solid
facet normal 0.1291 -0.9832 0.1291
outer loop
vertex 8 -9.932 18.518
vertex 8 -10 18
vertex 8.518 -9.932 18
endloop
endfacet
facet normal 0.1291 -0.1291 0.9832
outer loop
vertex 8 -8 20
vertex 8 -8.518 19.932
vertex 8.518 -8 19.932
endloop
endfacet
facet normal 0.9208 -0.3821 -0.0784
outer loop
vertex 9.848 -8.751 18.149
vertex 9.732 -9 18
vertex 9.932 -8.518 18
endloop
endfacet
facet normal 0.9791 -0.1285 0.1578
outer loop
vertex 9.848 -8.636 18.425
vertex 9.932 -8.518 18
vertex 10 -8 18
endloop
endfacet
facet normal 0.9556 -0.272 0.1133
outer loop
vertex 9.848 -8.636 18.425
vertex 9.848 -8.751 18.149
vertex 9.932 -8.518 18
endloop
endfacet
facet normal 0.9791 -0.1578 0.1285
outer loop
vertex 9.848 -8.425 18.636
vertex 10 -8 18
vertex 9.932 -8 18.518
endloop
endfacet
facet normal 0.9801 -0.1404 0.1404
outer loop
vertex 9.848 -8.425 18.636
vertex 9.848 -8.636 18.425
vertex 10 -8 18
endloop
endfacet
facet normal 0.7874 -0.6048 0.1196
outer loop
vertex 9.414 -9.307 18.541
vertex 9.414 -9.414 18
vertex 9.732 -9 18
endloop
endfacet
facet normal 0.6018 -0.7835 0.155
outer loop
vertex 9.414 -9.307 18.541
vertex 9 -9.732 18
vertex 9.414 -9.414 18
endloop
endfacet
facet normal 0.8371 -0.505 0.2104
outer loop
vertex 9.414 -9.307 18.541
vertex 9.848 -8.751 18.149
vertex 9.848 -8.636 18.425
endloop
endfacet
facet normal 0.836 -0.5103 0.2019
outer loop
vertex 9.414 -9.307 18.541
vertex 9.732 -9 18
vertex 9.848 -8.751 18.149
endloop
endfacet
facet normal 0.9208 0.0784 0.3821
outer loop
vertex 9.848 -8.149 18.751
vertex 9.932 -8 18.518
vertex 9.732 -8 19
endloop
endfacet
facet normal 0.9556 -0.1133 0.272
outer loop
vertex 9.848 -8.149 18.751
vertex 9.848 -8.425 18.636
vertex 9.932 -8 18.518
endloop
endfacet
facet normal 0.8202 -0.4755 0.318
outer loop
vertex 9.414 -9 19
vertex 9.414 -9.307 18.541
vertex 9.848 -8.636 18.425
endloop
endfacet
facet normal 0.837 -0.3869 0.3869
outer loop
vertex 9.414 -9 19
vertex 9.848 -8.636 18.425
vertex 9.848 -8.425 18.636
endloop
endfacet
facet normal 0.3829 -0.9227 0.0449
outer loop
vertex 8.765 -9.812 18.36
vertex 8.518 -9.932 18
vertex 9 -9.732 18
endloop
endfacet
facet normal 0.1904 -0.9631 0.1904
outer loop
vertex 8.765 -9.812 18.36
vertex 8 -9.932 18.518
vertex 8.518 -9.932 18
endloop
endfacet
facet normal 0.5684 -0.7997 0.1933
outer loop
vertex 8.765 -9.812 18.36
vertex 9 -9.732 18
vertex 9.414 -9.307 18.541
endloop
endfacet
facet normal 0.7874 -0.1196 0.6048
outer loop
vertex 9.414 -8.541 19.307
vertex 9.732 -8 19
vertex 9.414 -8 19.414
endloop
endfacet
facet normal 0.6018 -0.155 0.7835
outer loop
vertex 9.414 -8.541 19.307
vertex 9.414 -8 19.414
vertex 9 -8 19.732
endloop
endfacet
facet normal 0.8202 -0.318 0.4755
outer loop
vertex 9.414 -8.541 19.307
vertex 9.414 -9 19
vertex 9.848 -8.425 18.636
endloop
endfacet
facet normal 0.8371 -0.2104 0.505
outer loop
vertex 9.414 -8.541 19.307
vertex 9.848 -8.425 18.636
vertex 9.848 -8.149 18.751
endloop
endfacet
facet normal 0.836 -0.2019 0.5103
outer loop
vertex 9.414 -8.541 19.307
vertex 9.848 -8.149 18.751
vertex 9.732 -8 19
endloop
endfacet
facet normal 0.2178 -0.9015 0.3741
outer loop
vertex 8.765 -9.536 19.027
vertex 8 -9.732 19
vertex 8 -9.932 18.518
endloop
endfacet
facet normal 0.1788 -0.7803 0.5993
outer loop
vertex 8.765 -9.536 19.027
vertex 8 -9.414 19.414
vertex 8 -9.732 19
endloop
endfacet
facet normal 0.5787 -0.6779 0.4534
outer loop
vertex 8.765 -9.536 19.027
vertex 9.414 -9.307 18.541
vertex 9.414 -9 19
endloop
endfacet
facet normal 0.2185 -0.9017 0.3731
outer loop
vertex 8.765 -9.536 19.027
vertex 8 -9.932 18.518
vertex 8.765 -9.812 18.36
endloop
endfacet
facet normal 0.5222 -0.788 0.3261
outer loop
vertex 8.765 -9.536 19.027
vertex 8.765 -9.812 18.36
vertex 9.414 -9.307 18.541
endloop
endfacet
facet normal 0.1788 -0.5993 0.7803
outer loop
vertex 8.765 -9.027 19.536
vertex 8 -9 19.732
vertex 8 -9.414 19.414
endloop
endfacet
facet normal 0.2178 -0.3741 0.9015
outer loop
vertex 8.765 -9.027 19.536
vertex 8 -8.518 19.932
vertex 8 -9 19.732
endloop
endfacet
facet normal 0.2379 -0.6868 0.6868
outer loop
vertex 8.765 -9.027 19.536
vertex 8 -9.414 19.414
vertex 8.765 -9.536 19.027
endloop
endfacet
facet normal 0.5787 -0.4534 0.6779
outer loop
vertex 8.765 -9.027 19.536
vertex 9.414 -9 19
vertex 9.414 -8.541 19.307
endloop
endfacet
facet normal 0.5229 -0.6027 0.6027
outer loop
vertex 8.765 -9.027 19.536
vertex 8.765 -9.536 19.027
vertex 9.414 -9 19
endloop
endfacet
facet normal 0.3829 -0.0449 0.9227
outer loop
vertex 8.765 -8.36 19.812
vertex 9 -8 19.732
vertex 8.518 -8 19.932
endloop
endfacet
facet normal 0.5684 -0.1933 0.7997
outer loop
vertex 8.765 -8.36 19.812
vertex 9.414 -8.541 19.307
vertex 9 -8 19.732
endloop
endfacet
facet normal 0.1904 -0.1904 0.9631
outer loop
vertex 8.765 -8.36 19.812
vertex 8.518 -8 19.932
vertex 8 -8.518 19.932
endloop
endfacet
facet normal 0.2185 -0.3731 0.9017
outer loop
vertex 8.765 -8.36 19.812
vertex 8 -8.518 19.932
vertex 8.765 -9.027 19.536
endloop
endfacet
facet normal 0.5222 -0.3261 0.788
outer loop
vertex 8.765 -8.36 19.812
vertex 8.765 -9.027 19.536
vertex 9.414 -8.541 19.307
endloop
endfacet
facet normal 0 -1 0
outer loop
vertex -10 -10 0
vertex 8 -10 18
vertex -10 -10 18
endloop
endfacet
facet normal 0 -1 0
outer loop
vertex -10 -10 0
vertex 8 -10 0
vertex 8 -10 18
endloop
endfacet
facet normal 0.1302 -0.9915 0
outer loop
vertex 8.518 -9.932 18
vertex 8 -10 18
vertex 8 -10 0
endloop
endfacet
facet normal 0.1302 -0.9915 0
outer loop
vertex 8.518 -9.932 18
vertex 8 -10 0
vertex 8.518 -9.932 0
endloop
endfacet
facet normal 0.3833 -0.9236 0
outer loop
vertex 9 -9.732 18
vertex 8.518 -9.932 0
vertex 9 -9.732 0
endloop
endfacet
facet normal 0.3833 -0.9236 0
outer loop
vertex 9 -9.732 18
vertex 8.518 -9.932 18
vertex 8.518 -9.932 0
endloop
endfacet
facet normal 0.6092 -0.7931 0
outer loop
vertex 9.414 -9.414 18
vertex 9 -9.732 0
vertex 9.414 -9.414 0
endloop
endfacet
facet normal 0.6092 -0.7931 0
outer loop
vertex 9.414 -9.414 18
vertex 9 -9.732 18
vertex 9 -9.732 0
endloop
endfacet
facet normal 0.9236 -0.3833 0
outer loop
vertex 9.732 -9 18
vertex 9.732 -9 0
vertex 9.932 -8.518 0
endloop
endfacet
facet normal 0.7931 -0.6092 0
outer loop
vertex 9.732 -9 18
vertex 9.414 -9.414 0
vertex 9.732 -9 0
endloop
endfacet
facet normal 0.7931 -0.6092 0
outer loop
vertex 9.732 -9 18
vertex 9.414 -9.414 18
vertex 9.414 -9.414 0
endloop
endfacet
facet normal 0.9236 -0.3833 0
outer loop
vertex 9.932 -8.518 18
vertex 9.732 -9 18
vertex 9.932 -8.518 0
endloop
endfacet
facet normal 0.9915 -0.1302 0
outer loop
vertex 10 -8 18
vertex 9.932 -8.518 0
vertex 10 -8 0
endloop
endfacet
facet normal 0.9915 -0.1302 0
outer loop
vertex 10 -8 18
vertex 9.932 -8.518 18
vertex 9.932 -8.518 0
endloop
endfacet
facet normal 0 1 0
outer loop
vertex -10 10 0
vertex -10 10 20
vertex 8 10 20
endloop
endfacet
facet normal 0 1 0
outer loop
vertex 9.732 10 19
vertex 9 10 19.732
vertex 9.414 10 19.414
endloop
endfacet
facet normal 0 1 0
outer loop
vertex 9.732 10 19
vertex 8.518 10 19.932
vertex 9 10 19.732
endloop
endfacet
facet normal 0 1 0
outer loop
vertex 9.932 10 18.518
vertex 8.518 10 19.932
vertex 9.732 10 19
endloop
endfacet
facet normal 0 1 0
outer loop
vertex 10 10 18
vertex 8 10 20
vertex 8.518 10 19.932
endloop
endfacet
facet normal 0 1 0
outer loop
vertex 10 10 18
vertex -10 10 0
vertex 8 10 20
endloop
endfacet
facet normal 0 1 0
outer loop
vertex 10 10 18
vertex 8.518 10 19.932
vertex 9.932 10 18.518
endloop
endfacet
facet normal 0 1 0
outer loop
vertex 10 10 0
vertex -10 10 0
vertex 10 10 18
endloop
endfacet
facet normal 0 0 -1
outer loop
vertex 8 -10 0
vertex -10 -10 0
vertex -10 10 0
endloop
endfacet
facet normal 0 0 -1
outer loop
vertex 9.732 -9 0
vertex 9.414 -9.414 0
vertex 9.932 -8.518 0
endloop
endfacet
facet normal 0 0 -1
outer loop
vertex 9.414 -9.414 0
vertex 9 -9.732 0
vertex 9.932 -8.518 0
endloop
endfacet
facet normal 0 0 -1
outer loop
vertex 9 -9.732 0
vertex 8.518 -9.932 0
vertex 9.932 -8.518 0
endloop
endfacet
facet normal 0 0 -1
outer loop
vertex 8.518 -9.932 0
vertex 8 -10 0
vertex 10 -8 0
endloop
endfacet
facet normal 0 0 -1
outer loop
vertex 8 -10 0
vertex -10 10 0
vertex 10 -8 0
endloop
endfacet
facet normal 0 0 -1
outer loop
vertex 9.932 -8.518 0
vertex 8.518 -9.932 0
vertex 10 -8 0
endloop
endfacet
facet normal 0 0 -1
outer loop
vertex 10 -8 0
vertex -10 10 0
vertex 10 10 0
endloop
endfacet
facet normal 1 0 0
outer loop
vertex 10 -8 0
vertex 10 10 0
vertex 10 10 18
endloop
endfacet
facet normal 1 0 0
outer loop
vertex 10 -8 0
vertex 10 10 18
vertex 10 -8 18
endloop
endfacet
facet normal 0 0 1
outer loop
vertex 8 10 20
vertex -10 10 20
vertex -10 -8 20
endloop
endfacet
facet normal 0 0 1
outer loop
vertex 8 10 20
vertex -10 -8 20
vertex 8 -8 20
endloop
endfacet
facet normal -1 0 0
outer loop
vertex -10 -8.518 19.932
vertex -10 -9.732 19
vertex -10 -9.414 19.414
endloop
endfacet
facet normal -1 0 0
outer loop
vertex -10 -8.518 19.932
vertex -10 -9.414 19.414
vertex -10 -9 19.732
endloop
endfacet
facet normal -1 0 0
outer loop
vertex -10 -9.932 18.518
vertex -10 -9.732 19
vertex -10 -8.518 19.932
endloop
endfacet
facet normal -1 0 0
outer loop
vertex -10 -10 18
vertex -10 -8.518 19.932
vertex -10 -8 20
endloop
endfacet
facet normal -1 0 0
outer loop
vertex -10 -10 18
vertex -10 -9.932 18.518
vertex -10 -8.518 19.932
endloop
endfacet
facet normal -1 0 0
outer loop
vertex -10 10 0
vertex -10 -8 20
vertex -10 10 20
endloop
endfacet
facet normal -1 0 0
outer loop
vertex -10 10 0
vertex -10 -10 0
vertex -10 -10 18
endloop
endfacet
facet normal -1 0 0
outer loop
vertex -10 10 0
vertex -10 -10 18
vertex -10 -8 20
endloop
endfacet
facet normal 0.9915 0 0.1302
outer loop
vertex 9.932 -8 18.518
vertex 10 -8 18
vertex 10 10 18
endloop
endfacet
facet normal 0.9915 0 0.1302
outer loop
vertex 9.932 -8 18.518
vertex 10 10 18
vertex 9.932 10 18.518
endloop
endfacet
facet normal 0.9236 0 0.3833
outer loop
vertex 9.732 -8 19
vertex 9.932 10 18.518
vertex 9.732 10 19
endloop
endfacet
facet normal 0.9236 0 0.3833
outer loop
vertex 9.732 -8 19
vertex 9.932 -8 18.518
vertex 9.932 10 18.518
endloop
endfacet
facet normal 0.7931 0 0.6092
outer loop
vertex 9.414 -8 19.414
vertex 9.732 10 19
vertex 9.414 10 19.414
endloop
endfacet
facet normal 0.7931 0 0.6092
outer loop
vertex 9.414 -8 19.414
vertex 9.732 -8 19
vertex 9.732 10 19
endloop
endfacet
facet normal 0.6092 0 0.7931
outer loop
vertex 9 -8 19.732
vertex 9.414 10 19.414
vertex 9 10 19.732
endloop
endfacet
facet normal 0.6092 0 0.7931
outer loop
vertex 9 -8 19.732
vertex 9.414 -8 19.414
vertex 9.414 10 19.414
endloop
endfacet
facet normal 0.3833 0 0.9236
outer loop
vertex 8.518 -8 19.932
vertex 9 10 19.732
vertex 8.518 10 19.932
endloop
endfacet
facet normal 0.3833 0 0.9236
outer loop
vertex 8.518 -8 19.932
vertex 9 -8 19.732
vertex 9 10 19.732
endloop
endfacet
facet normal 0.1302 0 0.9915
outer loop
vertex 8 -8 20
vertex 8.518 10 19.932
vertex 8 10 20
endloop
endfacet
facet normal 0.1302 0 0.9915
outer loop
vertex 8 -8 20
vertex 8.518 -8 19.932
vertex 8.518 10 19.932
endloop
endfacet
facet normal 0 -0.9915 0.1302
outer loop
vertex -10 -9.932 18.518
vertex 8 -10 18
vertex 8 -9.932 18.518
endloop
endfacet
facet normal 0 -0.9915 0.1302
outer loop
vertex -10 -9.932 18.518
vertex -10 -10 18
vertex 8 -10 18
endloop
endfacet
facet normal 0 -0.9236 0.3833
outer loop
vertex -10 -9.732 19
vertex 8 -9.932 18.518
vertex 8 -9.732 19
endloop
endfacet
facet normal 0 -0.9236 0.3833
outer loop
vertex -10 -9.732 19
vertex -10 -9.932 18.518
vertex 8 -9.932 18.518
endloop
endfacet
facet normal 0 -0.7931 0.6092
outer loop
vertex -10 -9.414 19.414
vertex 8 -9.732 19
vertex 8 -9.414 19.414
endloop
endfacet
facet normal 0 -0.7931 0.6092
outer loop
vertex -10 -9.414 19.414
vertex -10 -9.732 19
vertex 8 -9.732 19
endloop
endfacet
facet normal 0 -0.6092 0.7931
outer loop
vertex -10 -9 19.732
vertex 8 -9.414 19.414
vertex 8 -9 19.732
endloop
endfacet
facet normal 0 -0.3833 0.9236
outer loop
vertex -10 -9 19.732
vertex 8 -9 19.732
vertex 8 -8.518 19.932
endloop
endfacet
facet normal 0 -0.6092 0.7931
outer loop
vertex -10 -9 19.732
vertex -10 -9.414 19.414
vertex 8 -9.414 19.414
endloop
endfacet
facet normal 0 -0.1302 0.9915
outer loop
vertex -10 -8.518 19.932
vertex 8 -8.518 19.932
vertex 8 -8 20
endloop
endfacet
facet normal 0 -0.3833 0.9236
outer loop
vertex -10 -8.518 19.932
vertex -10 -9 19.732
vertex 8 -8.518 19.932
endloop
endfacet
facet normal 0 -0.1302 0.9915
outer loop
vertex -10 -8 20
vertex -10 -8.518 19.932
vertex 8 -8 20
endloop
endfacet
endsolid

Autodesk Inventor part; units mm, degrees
ref_plane "YZ Plane" through (0, 0, 0) normal (1, 0, 0) x (0, 1, 0)
ref_plane "XZ Plane" through (0, 0, 0) normal (0, 1, 0) x (-1, 0, 0)
ref_plane "XY Plane" through (0, 0, 0) normal (0, 0, 1) x (1, 0, 0)
sketch "Sketch1" plane through (0, 0, 0) normal (0, 0, 1) x (1, 0, 0)
  arc A0 (-0.804, -1.9351) -> (0.804, -1.9351) centre (0, 0) ccw projected
  arc A1 (-2.1249, -2.3045) -> (-0.804, -1.9351) centre (-1.5684, -1.748) ccw projected
  line L0 (-2.3045, -2.1249) -> (-2.1249, -2.3045) projected
  arc A2 (-1.9351, -0.804) -> (-2.3045, -2.1249) centre (-1.748, -1.5684) ccw projected
  arc A3 (-1.9351, 0.804) -> (-1.9351, -0.804) centre (0, 0) ccw projected
  arc A4 (-2.3045, 2.1249) -> (-1.9351, 0.804) centre (-1.748, 1.5684) ccw projected
  line L1 (-2.1249, 2.3045) -> (-2.3045, 2.1249) projected
  arc A5 (-0.804, 1.9351) -> (-2.1249, 2.3045) centre (-1.5684, 1.748) ccw projected
  arc A6 (0.804, 1.9351) -> (-0.804, 1.9351) centre (0, 0) ccw projected
  arc A7 (2.1249, 2.3045) -> (0.804, 1.9351) centre (1.5684, 1.748) ccw projected
  line L2 (2.3045, 2.1249) -> (2.1249, 2.3045) projected
  arc A8 (1.9351, 0.804) -> (2.3045, 2.1249) centre (1.748, 1.5684) ccw projected
  arc A9 (1.9351, -0.804) -> (1.9351, 0.804) centre (0, 0) ccw projected
  arc A10 (2.3045, -2.1249) -> (1.9351, -0.804) centre (1.748, -1.5684) ccw projected
  line L3 (2.1249, -2.3045) -> (2.3045, -2.1249) projected
  arc A11 (0.804, -1.9351) -> (2.1249, -2.3045) centre (1.5684, -1.748) ccw projected
  arc A12 (8.5, 5.487) -> (7.992, 5.995) centre (7.992, 5.487) ccw projected
  line L4 (8.5, 3.138) -> (8.5, 5.487) projected
  arc A13 (8.5, 3.138) -> (9.008, 2.63) centre (9.008, 3.138) ccw projected
  line L5 (9.492, 2.63) -> (9.008, 2.63) projected
  arc A14 (9.492, 2.63) -> (10, 3.138) centre (9.492, 3.138) ccw projected
  line L6 (10, 8.5) -> (10, 3.138) projected
  arc A15 (10, 8.5) -> (8.5, 10) centre (8.5, 8.5) ccw projected
  line L7 (3.138, 10) -> (8.5, 10) projected
  arc A16 (3.138, 10) -> (2.63, 9.492) centre (3.138, 9.492) ccw projected
  line L8 (2.63, 9.008) -> (2.63, 9.492) projected
  arc A17 (2.63, 9.008) -> (3.138, 8.5) centre (3.138, 9.008) ccw projected
  line L9 (5.487, 8.5) -> (3.138, 8.5) projected
  arc A18 (5.995, 7.992) -> (5.487, 8.5) centre (5.487, 7.992) ccw projected
  line L10 (5.995, 7.2661) -> (5.995, 7.992) projected
  arc A19 (5.8462, 6.9069) -> (5.995, 7.2661) centre (5.487, 7.2661) ccw projected
  line L11 (2.7431, 3.8038) -> (5.8462, 6.9069) projected
  arc A20 (2.3839, 3.655) -> (2.7431, 3.8038) centre (2.3839, 4.163) ccw projected
  line L12 (-2.3839, 3.655) -> (2.3839, 3.655) projected
  arc A21 (-2.7431, 3.8038) -> (-2.3839, 3.655) centre (-2.3839, 4.163) ccw projected
  line L13 (-5.8462, 6.9069) -> (-2.7431, 3.8038) projected
  arc A22 (-5.995, 7.2661) -> (-5.8462, 6.9069) centre (-5.487, 7.2661) ccw projected
  line L14 (-5.995, 7.992) -> (-5.995, 7.2661) projected
  arc A23 (-5.487, 8.5) -> (-5.995, 7.992) centre (-5.487, 7.992) ccw projected
  line L15 (-3.138, 8.5) -> (-5.487, 8.5) projected
  arc A24 (-3.138, 8.5) -> (-2.63, 9.008) centre (-3.138, 9.008) ccw projected
  line L16 (-2.63, 9.492) -> (-2.63, 9.008) projected
  arc A25 (-2.63, 9.492) -> (-3.138, 10) centre (-3.138, 9.492) ccw projected
  line L17 (-8.5, 10) -> (-3.138, 10) projected
  arc A26 (-8.5, 10) -> (-10, 8.5) centre (-8.5, 8.5) ccw projected
  line L18 (-10, 3.138) -> (-10, 8.5) projected
  arc A27 (-10, 3.138) -> (-9.492, 2.63) centre (-9.492, 3.138) ccw projected
  line L19 (-9.008, 2.63) -> (-9.492, 2.63) projected
  arc A28 (-9.008, 2.63) -> (-8.5, 3.138) centre (-9.008, 3.138) ccw projected
  line L20 (-8.5, 5.487) -> (-8.5, 3.138) projected
  arc A29 (-7.992, 5.995) -> (-8.5, 5.487) centre (-7.992, 5.487) ccw projected
  line L21 (-7.2661, 5.995) -> (-7.992, 5.995) projected
  arc A30 (-6.9069, 5.8462) -> (-7.2661, 5.995) centre (-7.2661, 5.487) ccw projected
  line L22 (-3.8038, 2.7431) -> (-6.9069, 5.8462) projected
  arc A31 (-3.655, 2.3839) -> (-3.8038, 2.7431) centre (-4.163, 2.3839) ccw projected
  line L23 (-3.655, -2.3839) -> (-3.655, 2.3839) projected
  arc A32 (-3.8038, -2.7431) -> (-3.655, -2.3839) centre (-4.163, -2.3839) ccw projected
  line L24 (-6.9069, -5.8462) -> (-3.8038, -2.7431) projected
  arc A33 (-7.2661, -5.995) -> (-6.9069, -5.8462) centre (-7.2661, -5.487) ccw projected
  line L25 (-7.992, -5.995) -> (-7.2661, -5.995) projected
  arc A34 (-8.5, -5.487) -> (-7.992, -5.995) centre (-7.992, -5.487) ccw projected
  line L26 (-8.5, -3.138) -> (-8.5, -5.487) projected
  arc A35 (-8.5, -3.138) -> (-9.008, -2.63) centre (-9.008, -3.138) ccw projected
  line L27 (-9.492, -2.63) -> (-9.008, -2.63) projected
  arc A36 (-9.492, -2.63) -> (-10, -3.138) centre (-9.492, -3.138) ccw projected
  line L28 (-10, -8.5) -> (-10, -3.138) projected
  arc A37 (-10, -8.5) -> (-8.5, -10) centre (-8.5, -8.5) ccw projected
  line L29 (-3.138, -10) -> (-8.5, -10) projected
  arc A38 (-3.138, -10) -> (-2.63, -9.492) centre (-3.138, -9.492) ccw projected
  line L30 (-2.63, -9.008) -> (-2.63, -9.492) projected
  arc A39 (-2.63, -9.008) -> (-3.138, -8.5) centre (-3.138, -9.008) ccw projected
  line L31 (-5.487, -8.5) -> (-3.138, -8.5) projected
  arc A40 (-5.995, -7.992) -> (-5.487, -8.5) centre (-5.487, -7.992) ccw projected
  line L32 (-5.995, -7.2661) -> (-5.995, -7.992) projected
  arc A41 (-5.8462, -6.9069) -> (-5.995, -7.2661) centre (-5.487, -7.2661) ccw projected
  line L33 (-2.7431, -3.8038) -> (-5.8462, -6.9069) projected
  arc A42 (-2.3839, -3.655) -> (-2.7431, -3.8038) centre (-2.3839, -4.163) ccw projected
  line L34 (2.3839, -3.655) -> (-2.3839, -3.655) projected
  arc A43 (2.7431, -3.8038) -> (2.3839, -3.655) centre (2.3839, -4.163) ccw projected
  line L35 (5.8462, -6.9069) -> (2.7431, -3.8038) projected
  arc A44 (5.995, -7.2661) -> (5.8462, -6.9069) centre (5.487, -7.2661) ccw projected
  line L36 (5.995, -7.992) -> (5.995, -7.2661) projected
  arc A45 (5.487, -8.5) -> (5.995, -7.992) centre (5.487, -7.992) ccw projected
  line L37 (3.138, -8.5) -> (5.487, -8.5) projected
  arc A46 (3.138, -8.5) -> (2.63, -9.008) centre (3.138, -9.008) ccw projected
  line L38 (2.63, -9.492) -> (2.63, -9.008) projected
  arc A47 (2.63, -9.492) -> (3.138, -10) centre (3.138, -9.492) ccw projected
  line L39 (8.5, -10) -> (3.138, -10) projected
  arc A48 (8.5, -10) -> (10, -8.5) centre (8.5, -8.5) ccw projected
  line L40 (10, -3.138) -> (10, -8.5) projected
  arc A49 (10, -3.138) -> (9.492, -2.63) centre (9.492, -3.138) ccw projected
  line L41 (9.008, -2.63) -> (9.492, -2.63) projected
  arc A50 (9.008, -2.63) -> (8.5, -3.138) centre (9.008, -3.138) ccw projected
  line L42 (8.5, -5.487) -> (8.5, -3.138) projected
  arc A51 (7.992, -5.995) -> (8.5, -5.487) centre (7.992, -5.487) ccw projected
  line L43 (7.2661, -5.995) -> (7.992, -5.995) projected
  arc A52 (6.9069, -5.8462) -> (7.2661, -5.995) centre (7.2661, -5.487) ccw projected
  line L44 (3.8038, -2.7431) -> (6.9069, -5.8462) projected
  arc A53 (3.655, -2.3839) -> (3.8038, -2.7431) centre (4.163, -2.3839) ccw projected
  line L45 (3.655, 2.3839) -> (3.655, -2.3839) projected
  arc A54 (3.8038, 2.7431) -> (3.655, 2.3839) centre (4.163, 2.3839) ccw projected
  line L46 (6.9069, 5.8462) -> (3.8038, 2.7431) projected
  arc A55 (7.2661, 5.995) -> (6.9069, 5.8462) centre (7.2661, 5.487) ccw projected
  line L47 (7.992, 5.995) -> (7.2661, 5.995) projected
  line L48 (10, -10) -> (-10, -10)
  line L49 (-10, -10) -> (-10, 10)
  line L50 (-10, 10) -> (10, 10)
  line L51 (10, 10) -> (10, -10)
  point P0 (0, 0)
extrude "Extrusion1" add sketch "Sketch1" along normal blind 20 contours A1 L0 A2 A3 A4 L1 A5 A6 A7 L2 A8 A9 A10 L3 A11 A0 | L4 A13 L5 A14 L51 A49 L41 A50 L42 A51 L43 A52 L44 A53 L45 A54 L46 A55 L47 A12 | A12 L47 A55 L46 A54 L45 A53 L44 A52 L43 A51 L42 A50 L41 A49 L40 A48 L39 A47 L38 A46 L37 A45 L36 A44 L35 A43 L34 A42 L33 A41 L32 A40 L31 A39 L30 A38 L29 A37 L28 A36 L27 A35 L26 A34 L25 A33 L24 A32 L23 A31 L22 A30 L21 A29 L20 A28 L19 A27 L18 A26 L17 A25 L16 A24 L15 A23 L14 A22 L13 A21 L12 A20 L11 A19 L10 A18 L9 A17 L8 A16 L7 A15 L6 A14 L5 A13 L4 | A15 L50 L51 | L51 L48 A48 | A16 L8 A17 L9 A18 L10 A19 L11 A20 L12 A21 L13 A22 L14 A23 L15 A24 L16 A25 L50 | L48 A38 L30 A39 L31 A40 L32 A41 L33 A42 L34 A43 L35 A44 L36 A45 L37 A46 L38 A47 | A26 L49 L50 | L48 L49 A37 | A27 L19 A28 L20 A29 L21 A30 L22 A31 L23 A32 L24 A33 L25 A34 L26 A35 L27 A36 L49
fillet "Fillet1" radius 2 3 edges at (0, -10, 20) (10, -10, 10) (10, 0, 20)
properties part number "corner"
